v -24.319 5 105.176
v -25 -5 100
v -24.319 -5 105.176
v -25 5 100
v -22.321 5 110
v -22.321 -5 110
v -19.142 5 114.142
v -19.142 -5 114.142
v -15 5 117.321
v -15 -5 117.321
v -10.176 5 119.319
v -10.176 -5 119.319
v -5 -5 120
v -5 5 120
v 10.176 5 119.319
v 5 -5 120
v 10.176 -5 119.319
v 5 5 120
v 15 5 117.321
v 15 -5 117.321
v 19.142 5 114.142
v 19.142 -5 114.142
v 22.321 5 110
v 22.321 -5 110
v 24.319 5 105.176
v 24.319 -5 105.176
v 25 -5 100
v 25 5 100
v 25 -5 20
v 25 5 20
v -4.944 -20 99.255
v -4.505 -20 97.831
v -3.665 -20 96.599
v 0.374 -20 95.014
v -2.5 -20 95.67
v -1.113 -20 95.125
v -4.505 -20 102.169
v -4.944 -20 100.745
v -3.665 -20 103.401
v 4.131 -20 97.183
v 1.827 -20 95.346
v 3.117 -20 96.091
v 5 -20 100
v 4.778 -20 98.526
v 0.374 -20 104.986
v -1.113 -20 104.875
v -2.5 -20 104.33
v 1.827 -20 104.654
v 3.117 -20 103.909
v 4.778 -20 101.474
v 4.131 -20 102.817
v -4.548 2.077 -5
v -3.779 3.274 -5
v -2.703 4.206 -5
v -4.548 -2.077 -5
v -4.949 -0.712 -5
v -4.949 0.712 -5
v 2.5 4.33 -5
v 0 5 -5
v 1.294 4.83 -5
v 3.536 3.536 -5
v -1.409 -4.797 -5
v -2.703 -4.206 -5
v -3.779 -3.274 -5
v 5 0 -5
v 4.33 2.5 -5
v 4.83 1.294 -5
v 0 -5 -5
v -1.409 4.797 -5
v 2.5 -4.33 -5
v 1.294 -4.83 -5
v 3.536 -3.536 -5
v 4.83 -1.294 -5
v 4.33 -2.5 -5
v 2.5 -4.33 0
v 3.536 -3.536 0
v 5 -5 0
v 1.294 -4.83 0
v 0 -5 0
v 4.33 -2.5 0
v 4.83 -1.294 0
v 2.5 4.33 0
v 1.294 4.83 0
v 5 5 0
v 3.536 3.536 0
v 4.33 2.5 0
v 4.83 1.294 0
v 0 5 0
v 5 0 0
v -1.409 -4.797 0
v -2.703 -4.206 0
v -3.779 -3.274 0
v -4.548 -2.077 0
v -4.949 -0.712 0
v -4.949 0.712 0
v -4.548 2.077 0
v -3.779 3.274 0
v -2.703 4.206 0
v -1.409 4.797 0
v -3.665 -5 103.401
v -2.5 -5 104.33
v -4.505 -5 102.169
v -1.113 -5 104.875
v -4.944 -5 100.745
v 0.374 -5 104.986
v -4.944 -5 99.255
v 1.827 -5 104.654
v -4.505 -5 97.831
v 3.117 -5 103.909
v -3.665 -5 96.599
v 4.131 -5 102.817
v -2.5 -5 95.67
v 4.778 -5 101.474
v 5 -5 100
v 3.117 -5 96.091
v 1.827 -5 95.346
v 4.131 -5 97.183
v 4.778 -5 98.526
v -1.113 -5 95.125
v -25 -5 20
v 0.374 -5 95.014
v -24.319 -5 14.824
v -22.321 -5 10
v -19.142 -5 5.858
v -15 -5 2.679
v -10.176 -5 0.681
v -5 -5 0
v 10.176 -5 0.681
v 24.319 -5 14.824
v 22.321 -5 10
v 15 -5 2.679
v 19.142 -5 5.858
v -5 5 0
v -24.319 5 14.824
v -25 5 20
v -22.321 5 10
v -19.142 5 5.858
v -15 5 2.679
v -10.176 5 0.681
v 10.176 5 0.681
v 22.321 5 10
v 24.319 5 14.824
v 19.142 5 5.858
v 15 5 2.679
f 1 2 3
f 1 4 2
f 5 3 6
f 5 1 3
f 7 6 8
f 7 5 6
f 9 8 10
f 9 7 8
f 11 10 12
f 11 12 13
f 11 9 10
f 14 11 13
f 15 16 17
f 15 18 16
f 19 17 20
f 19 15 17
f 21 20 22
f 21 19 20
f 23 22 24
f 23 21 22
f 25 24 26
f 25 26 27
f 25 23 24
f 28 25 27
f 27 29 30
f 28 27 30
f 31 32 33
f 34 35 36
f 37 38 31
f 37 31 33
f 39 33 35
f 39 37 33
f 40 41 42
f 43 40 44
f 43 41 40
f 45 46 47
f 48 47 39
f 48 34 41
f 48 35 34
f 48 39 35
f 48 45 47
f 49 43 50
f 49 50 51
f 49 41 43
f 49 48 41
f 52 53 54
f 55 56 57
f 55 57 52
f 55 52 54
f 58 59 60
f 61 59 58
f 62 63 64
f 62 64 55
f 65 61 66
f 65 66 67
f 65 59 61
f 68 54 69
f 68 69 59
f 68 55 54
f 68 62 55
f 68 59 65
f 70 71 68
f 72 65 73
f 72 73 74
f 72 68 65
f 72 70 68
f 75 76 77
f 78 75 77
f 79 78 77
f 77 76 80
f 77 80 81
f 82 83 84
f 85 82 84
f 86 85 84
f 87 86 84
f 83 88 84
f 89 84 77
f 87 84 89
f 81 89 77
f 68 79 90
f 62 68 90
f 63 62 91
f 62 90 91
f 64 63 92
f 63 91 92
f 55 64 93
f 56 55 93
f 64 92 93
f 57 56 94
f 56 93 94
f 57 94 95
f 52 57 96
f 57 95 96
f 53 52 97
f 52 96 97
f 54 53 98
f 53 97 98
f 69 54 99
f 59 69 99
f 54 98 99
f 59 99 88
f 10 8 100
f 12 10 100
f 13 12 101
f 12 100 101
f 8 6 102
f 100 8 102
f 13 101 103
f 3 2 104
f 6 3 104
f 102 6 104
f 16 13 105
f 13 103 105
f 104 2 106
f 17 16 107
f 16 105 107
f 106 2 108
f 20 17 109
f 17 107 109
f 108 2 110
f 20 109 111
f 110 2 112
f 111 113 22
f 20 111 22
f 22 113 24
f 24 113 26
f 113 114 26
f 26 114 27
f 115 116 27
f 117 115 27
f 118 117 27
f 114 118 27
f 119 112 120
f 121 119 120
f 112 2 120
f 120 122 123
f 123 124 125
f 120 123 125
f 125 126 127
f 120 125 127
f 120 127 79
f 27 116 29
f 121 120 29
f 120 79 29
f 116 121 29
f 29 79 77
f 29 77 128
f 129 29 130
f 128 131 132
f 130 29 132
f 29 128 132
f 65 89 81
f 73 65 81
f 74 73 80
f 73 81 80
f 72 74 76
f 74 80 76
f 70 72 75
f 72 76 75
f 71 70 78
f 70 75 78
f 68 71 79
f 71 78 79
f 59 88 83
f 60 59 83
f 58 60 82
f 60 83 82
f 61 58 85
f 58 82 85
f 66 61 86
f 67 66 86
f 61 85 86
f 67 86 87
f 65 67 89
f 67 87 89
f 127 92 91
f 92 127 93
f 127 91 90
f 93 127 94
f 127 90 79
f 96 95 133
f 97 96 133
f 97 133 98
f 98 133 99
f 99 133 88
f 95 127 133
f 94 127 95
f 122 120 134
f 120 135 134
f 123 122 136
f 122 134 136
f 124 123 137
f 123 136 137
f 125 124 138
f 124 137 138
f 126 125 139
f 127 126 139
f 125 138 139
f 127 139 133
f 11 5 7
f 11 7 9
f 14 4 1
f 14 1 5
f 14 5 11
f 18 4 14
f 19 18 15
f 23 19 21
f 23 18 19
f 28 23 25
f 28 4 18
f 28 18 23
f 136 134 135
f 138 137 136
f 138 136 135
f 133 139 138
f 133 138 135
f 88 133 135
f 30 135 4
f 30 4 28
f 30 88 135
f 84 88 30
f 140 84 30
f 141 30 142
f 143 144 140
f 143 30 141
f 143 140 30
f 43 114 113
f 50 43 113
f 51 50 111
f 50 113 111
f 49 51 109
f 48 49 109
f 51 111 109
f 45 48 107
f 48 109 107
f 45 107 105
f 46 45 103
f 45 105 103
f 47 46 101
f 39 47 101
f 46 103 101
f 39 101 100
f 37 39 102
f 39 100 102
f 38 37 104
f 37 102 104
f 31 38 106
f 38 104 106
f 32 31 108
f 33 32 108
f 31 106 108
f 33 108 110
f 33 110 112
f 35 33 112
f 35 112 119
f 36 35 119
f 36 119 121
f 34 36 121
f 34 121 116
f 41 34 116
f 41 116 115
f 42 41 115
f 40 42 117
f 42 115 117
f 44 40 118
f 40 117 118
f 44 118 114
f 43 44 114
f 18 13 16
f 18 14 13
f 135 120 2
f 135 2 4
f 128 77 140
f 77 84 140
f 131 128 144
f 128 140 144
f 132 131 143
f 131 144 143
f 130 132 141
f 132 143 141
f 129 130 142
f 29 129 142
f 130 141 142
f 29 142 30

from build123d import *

# Parameters (mm, degrees)
F0_W     = 50
F0_H     = 10
F1_DEPTH = 120
F2_R     = 5
F3_DEPTH = 15
F5_DEPTH = 5
F6_R     = 19.99999


# Not quite as in the source:
# - a fillet or chamfer is up to 0.001 mm smaller than in the source, because OpenCascade refuses the exact size


with BuildPart() as f1:
    # F0 (on Top) → F1 (new body)
    with BuildSketch(Plane.XY):
        Rectangle(F0_W, F0_H)
    extrude(amount=F1_DEPTH)

    # F2 (on face) → F3 (join)
    with BuildSketch(Plane.XZ.offset(5)):
        with Locations((0, 100)):
            Circle(F2_R)
    extrude(amount=F3_DEPTH)

    # F4 (on face) → F5 (join)
    with BuildSketch(Plane(origin=(0, 0, 0), x_dir=(1, 0, 0), z_dir=(0, 0, -1))):
        with BuildLine():
            ThreePointArc((-3.84e-08, -5), (3.5355338924, -3.5355339195), (5, 0))
            ThreePointArc((5, 0), (3.5355339085, 3.5355339034), (7.2e-09, 5))
            ThreePointArc((7.2e-09, 5), (-5, 2.28e-08), (-3.84e-08, -5))
        make_face()
    extrude(amount=F5_DEPTH)

    # F6 (radius 20 in the source; OpenCascade refuses exactly that, so slightly less here)
    f6_edges = [f1.edges().sort_by_distance(p)[0] for p in [
        (25, 0, 0),
        (-25, 0, 0),
        (-25, 0, 120),
        (25, 0, 120),
    ]]
    fillet(f6_edges, radius=F6_R)


solid = f1.part
